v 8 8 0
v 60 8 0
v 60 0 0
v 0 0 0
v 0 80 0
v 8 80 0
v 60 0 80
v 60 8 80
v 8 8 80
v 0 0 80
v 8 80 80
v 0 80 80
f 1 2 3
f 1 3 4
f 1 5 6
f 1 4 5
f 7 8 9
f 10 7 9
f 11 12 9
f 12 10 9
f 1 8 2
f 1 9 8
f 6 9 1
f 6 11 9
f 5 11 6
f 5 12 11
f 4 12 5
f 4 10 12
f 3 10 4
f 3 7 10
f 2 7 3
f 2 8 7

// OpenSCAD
$fn = 32;

// ----------------------------------------------------------------------
// Structural section: angle 60 x 80 mm
// ----------------------------------------------------------------------

// --- parameters (mm) ---
sec_w = 60;               // leg width, X
sec_h = 80;               // leg height, Y
flange_t = 8;             // leg thickness
plate_t = 80;             // cut length, Z (extrusion height)

profile = [[0, 0], [60, 0], [60, 8], [8, 8], [8, 80], [0, 80]];  // primary outline, 6 points, counter clockwise

// --- the one profile operation ---
linear_extrude(height = plate_t) polygon(points = profile);
